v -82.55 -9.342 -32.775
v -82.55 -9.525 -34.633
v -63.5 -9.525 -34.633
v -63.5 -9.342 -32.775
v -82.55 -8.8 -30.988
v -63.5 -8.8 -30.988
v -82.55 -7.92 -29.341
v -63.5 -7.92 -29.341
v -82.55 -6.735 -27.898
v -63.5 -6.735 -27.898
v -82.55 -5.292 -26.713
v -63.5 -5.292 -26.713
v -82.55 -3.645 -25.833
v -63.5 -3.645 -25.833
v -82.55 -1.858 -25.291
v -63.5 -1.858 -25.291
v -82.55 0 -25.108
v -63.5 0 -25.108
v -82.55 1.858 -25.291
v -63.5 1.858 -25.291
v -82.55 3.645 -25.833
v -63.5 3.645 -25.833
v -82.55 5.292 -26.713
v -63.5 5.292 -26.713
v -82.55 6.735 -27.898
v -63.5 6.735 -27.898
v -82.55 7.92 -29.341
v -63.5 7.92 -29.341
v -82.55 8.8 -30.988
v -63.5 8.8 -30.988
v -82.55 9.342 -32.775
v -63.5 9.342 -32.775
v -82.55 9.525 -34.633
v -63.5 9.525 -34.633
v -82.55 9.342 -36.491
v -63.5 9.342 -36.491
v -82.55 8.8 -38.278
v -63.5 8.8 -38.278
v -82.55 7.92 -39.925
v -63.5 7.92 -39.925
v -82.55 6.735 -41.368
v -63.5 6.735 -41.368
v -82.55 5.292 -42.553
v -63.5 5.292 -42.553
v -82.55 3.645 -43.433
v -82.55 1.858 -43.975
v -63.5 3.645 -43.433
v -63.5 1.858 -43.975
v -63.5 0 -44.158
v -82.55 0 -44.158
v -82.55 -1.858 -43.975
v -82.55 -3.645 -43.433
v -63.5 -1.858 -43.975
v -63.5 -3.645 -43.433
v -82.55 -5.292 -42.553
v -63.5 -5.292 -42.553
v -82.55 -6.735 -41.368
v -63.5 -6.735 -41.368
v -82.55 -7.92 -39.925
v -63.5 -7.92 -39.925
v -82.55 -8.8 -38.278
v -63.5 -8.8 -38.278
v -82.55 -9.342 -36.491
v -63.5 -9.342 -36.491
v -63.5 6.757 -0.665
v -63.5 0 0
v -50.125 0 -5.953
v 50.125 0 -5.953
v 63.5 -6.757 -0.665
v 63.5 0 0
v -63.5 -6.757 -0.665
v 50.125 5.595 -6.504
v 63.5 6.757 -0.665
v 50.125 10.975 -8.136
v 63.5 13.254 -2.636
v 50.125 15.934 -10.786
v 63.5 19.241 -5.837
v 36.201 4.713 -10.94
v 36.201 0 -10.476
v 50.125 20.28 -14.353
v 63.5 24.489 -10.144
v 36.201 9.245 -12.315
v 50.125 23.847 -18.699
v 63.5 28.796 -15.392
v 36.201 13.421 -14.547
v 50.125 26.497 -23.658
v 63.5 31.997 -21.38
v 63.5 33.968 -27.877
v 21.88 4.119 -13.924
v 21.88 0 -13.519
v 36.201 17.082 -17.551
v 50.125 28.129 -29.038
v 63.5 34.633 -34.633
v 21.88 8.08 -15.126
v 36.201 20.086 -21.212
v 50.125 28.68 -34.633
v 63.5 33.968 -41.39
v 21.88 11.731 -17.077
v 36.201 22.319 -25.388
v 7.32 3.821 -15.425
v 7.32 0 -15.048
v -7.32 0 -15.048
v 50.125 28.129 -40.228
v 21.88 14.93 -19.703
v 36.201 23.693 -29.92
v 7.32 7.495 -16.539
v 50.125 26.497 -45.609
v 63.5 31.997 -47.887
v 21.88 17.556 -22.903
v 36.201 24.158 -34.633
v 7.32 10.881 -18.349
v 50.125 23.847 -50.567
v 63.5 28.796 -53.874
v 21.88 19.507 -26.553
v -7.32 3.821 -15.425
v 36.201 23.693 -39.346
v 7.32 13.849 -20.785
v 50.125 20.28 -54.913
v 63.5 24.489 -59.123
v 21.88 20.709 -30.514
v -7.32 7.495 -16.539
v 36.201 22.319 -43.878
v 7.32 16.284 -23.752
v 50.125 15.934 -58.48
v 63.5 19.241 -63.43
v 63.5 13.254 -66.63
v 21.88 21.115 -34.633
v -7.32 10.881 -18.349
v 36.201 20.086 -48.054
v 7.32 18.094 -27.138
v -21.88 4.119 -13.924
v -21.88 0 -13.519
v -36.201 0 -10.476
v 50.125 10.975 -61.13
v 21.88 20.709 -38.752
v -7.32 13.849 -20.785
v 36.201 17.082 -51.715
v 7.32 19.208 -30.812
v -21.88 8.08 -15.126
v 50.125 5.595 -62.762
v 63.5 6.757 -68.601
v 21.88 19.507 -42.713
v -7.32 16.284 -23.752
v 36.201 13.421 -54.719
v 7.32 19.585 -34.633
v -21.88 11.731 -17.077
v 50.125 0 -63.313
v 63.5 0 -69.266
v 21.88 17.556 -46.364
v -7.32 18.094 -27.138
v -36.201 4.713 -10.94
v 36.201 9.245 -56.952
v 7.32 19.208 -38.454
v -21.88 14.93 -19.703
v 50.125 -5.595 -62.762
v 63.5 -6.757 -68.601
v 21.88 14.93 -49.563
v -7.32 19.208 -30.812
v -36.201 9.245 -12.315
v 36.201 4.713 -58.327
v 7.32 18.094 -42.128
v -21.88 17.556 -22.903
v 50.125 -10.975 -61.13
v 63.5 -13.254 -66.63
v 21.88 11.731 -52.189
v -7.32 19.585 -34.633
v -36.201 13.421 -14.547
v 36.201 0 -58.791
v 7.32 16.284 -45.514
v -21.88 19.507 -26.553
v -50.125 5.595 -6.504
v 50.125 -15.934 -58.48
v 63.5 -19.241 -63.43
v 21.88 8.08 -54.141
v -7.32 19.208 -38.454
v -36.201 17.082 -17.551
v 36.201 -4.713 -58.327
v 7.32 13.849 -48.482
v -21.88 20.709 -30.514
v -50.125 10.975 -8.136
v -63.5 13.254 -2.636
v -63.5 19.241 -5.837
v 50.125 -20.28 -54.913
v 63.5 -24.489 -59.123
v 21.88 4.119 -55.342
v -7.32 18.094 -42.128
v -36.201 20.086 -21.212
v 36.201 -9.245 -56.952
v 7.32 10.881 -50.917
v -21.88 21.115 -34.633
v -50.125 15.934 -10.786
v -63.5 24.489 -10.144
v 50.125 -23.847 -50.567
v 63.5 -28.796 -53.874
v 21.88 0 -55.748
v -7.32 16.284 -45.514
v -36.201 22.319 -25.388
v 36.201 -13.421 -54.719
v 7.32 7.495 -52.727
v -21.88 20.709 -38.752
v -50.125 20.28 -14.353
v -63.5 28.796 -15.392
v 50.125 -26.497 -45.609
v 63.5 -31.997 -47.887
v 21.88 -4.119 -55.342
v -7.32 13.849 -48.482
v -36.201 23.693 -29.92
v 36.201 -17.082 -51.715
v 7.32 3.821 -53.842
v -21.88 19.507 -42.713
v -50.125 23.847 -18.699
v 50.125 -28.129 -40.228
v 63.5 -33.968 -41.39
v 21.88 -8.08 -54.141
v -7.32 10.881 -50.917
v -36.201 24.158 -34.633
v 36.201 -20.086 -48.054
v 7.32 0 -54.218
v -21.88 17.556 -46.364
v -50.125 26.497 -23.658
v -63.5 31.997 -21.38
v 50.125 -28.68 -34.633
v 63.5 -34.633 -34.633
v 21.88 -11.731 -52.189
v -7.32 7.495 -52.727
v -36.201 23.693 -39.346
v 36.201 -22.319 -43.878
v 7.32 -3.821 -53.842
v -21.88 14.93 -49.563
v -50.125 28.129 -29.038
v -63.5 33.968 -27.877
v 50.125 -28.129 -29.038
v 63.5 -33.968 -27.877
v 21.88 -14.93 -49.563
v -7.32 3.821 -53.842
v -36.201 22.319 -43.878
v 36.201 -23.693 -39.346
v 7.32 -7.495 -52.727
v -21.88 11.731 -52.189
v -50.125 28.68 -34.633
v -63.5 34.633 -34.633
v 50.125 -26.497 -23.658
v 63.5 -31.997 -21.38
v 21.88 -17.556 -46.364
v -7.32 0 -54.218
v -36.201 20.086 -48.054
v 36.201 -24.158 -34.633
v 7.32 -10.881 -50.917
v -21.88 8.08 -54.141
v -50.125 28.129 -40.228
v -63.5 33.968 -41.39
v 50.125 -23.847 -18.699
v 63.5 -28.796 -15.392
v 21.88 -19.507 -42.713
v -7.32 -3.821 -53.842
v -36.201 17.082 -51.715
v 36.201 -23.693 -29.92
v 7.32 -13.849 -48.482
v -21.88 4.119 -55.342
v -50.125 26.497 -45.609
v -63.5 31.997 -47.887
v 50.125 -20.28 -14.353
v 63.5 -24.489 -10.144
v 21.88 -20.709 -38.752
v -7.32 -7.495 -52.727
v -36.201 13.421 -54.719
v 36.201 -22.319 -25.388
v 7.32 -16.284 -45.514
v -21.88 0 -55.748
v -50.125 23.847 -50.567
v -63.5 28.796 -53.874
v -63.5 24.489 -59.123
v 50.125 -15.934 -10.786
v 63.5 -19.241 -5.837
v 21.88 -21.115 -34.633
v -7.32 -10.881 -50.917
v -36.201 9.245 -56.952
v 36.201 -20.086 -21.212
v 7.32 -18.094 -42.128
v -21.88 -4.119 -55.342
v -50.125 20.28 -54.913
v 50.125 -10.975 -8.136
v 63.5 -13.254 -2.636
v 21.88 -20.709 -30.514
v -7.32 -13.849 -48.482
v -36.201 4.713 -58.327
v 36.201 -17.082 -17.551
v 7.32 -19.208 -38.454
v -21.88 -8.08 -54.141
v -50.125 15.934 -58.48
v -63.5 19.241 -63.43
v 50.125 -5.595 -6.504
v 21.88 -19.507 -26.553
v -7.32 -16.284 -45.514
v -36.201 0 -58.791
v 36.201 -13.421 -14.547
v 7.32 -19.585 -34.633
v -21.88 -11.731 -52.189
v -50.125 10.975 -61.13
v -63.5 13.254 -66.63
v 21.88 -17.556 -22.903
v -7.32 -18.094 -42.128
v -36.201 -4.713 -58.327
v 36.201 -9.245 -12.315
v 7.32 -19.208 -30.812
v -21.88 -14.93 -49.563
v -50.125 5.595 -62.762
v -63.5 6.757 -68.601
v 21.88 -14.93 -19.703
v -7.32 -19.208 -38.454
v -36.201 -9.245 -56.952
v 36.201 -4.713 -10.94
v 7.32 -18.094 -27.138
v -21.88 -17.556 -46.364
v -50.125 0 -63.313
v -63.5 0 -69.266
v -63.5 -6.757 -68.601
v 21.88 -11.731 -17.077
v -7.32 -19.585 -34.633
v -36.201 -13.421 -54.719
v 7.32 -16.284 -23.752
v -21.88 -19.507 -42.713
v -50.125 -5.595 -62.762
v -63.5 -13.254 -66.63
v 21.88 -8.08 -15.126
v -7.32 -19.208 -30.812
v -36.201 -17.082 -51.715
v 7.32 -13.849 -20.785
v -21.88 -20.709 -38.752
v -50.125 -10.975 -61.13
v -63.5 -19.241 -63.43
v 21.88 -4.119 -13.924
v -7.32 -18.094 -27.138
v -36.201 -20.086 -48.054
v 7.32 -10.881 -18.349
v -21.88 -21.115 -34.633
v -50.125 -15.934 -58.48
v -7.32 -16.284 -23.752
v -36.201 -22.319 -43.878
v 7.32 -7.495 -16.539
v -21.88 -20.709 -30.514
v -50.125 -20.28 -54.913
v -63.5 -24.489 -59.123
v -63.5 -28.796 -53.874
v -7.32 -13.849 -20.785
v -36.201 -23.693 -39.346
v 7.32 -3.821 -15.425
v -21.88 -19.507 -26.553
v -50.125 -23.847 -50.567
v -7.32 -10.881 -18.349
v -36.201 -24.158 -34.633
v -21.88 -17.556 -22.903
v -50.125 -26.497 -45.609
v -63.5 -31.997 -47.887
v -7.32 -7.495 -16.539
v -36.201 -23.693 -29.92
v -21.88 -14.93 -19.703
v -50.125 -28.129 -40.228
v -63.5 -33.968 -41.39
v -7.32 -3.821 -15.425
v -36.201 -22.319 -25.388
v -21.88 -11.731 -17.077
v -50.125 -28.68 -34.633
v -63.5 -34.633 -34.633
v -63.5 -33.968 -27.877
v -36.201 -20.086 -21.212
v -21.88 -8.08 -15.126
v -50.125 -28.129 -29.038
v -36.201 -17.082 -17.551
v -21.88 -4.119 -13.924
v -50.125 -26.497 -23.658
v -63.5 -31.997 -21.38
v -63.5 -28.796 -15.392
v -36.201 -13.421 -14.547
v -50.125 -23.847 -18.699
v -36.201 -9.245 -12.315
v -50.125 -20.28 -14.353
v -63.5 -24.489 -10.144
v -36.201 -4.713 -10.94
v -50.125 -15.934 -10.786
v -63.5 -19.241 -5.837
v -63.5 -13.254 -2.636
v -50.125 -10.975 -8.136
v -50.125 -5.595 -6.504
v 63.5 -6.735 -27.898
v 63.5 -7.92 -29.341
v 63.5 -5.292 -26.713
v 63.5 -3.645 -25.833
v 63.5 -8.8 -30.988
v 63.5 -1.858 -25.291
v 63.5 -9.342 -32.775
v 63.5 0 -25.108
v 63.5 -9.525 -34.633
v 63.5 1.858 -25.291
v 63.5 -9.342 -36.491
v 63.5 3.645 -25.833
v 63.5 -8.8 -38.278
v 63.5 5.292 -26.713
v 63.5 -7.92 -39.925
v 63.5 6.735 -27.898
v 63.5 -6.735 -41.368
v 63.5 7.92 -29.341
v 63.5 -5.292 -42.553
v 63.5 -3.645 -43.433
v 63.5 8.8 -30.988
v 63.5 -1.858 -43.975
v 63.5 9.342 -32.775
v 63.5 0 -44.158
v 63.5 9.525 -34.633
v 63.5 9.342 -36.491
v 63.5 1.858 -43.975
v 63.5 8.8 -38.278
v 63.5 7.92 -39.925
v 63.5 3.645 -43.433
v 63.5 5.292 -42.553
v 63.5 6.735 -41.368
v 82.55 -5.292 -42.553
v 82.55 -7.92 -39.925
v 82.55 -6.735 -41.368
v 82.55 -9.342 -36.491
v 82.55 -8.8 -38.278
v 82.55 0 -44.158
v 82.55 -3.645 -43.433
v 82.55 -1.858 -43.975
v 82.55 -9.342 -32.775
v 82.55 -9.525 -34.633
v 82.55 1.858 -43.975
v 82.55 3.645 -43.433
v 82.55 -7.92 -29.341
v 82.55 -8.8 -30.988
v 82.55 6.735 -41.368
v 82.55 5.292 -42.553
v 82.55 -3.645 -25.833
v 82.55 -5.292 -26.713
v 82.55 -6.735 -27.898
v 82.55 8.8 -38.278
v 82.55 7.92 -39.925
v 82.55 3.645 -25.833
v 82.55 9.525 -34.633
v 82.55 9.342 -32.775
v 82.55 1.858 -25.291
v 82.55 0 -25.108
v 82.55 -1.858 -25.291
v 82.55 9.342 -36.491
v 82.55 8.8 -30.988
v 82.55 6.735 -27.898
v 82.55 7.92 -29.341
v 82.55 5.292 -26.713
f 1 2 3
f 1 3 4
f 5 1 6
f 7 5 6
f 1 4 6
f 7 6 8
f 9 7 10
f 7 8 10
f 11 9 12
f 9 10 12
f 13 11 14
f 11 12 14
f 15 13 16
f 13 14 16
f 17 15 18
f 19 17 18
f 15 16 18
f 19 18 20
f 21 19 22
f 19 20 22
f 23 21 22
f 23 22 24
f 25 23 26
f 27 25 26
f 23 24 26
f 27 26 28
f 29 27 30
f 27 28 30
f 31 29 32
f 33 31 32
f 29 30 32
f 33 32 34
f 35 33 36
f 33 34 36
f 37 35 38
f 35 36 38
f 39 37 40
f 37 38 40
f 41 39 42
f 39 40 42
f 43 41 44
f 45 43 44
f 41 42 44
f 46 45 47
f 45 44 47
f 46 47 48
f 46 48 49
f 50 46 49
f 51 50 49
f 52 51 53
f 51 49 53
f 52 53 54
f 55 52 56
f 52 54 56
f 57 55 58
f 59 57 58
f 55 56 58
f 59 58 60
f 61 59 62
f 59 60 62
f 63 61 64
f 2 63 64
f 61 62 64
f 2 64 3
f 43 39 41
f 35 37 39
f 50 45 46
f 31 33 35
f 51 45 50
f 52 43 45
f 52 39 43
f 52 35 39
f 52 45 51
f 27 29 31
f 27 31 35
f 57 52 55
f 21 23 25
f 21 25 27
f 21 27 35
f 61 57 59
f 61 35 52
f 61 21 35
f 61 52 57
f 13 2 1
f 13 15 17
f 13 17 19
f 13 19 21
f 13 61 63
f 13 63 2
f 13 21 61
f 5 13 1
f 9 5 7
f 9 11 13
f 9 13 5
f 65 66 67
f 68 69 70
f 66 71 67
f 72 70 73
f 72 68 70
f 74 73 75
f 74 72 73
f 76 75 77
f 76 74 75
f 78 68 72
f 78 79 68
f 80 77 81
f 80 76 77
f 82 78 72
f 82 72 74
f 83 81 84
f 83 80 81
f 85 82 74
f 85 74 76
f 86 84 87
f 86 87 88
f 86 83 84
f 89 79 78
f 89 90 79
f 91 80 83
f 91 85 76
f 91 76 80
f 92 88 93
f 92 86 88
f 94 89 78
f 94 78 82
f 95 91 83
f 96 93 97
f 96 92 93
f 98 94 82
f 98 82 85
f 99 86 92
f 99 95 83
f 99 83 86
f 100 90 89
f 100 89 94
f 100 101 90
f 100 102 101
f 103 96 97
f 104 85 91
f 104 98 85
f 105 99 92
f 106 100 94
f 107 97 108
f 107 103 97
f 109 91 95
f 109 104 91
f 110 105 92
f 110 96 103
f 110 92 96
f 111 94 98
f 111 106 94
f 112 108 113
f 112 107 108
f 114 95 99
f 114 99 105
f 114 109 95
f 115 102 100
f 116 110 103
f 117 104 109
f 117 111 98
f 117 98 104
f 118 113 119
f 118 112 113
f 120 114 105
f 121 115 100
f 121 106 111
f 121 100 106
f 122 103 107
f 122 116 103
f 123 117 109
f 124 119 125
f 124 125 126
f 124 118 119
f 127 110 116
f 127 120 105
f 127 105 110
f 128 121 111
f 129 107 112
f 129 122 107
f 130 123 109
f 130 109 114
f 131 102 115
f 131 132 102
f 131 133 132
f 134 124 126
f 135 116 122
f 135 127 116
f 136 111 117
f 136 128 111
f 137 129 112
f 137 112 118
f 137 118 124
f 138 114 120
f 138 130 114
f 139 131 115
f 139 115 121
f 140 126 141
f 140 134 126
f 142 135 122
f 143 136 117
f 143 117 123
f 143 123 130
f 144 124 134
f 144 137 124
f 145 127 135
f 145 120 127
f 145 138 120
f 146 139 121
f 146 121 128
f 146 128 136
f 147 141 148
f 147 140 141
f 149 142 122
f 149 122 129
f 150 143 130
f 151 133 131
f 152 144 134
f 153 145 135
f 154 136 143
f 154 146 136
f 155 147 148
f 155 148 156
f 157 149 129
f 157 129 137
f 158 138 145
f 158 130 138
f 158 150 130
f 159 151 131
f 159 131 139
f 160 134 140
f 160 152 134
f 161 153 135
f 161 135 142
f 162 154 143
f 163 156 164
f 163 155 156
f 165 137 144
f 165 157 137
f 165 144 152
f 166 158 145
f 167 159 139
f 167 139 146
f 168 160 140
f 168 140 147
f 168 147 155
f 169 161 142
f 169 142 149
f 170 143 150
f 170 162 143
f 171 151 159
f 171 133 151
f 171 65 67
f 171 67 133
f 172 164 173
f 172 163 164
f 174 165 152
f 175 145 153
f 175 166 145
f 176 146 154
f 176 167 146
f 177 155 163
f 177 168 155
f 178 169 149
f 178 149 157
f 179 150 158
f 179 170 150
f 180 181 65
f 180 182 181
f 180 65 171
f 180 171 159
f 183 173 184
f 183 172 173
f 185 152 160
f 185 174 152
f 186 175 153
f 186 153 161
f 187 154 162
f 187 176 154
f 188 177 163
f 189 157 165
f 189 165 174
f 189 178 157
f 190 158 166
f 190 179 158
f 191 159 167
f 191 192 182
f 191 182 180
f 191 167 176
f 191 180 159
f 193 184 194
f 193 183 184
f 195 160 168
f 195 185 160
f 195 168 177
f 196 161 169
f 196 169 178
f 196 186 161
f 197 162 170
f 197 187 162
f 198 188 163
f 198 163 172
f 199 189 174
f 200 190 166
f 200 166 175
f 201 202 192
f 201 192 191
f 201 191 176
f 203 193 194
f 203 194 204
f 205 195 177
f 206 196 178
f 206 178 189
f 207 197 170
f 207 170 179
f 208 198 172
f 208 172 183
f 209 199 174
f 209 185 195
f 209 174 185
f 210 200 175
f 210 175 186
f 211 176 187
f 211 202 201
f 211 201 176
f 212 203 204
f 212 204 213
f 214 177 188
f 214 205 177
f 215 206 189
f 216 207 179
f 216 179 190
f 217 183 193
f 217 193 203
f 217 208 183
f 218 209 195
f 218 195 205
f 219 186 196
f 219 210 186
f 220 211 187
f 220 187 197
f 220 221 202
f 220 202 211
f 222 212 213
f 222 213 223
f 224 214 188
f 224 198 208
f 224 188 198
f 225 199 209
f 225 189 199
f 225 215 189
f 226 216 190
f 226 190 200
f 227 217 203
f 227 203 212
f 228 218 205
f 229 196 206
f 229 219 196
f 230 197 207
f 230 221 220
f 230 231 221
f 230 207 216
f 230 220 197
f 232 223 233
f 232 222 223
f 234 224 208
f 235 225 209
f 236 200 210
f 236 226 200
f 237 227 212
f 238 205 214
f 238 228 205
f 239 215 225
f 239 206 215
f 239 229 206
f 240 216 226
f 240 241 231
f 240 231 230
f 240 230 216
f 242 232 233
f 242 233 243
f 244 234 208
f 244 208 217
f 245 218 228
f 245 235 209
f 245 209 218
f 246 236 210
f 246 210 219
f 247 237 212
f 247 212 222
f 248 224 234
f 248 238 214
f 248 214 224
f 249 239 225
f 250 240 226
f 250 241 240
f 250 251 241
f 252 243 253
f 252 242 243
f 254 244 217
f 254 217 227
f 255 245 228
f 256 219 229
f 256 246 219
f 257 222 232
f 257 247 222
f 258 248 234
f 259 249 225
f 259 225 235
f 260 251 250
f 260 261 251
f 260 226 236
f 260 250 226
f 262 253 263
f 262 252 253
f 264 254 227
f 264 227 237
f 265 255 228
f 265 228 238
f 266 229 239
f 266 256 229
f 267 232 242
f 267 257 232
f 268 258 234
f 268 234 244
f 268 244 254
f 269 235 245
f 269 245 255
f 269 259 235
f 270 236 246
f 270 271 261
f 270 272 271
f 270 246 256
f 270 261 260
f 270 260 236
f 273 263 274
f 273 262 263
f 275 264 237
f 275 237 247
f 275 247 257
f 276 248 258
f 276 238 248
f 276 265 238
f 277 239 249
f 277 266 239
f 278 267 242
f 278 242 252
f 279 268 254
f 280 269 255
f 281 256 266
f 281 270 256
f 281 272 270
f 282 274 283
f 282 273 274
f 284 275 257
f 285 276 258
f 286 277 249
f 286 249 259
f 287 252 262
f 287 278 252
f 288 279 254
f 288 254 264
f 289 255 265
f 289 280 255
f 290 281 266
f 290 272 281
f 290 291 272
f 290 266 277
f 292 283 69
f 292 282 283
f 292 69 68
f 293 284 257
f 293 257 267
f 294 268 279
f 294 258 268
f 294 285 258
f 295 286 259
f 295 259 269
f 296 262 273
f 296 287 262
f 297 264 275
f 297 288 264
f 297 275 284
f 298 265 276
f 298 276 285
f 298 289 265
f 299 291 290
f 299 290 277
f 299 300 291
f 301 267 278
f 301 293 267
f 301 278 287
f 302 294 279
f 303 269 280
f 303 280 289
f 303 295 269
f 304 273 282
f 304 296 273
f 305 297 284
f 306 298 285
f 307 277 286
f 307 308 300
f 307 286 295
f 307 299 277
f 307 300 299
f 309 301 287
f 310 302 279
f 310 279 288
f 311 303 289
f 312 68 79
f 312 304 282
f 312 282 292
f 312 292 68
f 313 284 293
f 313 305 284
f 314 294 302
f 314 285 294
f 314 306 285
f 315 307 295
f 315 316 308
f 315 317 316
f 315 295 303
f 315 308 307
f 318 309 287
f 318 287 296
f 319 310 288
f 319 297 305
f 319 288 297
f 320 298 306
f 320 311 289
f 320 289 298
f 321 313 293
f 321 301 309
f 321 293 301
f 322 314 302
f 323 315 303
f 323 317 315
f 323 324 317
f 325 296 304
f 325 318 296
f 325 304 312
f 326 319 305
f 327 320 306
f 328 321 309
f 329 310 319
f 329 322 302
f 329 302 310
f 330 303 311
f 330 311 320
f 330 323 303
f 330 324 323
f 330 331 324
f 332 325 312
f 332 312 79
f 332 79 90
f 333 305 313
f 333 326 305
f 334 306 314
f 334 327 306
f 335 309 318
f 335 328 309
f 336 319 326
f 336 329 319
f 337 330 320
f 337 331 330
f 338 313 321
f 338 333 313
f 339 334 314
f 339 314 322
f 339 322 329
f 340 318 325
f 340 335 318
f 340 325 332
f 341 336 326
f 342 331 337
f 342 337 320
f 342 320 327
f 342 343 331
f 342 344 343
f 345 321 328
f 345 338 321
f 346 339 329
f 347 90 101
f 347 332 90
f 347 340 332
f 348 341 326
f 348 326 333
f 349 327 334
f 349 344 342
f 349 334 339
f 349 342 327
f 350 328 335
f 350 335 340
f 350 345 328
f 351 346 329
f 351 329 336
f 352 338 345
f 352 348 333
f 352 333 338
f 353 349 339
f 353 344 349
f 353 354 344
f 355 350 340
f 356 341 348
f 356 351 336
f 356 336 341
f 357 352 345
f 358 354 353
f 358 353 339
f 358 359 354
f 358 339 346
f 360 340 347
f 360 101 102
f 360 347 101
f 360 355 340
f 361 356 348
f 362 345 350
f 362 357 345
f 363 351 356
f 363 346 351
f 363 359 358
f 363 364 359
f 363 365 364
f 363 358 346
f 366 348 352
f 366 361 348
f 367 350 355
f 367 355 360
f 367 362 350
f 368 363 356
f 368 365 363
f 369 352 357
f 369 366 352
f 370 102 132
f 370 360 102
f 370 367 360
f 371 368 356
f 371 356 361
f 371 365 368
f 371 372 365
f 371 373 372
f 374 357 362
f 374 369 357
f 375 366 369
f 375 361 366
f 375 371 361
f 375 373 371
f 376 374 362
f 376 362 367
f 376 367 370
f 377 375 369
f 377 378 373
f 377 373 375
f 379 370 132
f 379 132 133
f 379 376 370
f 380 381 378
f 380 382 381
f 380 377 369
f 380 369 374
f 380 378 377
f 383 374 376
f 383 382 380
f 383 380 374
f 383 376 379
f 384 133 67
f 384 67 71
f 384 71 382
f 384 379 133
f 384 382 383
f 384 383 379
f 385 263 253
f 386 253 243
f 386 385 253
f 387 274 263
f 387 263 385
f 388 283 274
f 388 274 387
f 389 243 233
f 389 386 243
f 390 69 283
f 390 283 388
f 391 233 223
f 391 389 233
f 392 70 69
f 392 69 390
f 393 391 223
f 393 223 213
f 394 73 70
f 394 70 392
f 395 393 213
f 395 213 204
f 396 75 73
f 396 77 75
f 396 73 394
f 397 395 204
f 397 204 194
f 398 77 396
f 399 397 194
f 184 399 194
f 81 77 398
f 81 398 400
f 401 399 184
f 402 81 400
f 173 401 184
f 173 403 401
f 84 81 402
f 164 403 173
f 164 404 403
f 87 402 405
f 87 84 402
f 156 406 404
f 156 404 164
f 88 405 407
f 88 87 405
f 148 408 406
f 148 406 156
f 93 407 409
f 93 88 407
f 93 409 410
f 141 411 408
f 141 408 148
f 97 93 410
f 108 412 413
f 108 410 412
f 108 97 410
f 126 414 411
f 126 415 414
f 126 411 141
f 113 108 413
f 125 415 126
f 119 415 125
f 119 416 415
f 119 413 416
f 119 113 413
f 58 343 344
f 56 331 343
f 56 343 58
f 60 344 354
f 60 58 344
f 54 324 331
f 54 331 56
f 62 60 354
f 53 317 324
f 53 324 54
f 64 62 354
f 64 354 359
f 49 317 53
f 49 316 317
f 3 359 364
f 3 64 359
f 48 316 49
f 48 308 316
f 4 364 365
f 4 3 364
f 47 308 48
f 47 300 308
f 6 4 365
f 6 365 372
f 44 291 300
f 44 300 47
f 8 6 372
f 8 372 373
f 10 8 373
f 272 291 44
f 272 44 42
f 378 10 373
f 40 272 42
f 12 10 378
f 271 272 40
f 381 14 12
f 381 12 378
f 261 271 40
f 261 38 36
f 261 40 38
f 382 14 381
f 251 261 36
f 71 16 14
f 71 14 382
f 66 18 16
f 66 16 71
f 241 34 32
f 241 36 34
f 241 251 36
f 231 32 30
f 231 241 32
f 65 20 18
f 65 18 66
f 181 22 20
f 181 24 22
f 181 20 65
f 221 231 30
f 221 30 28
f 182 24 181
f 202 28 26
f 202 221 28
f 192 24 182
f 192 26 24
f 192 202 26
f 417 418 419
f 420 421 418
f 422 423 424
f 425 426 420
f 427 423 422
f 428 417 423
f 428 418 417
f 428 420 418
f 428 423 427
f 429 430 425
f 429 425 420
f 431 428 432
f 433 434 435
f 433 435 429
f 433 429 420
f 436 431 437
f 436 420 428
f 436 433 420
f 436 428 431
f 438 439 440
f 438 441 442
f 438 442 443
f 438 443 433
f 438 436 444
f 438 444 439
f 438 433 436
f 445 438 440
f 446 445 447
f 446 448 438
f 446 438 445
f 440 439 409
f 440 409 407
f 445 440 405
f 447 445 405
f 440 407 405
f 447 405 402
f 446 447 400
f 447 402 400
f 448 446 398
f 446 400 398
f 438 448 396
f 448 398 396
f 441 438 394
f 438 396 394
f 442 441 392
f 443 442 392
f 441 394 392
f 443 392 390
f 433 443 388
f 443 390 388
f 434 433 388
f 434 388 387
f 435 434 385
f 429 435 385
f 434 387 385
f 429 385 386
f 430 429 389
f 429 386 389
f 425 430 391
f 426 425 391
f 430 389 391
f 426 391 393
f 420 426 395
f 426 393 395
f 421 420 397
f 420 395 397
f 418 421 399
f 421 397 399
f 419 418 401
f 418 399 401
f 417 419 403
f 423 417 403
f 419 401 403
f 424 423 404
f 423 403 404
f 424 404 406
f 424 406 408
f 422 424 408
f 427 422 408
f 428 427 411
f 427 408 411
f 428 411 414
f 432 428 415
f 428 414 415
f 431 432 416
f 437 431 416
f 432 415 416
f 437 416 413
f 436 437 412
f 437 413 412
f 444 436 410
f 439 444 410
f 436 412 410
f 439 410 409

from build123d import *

# Parameters (mm, degrees)
F2_R     = 9.525
F3_DEPTH = 19.05
F4_R     = 9.525
F5_DEPTH = 19.05


with BuildPart() as f1:
    # F0 (on Front) → F1 (revolve)
    with BuildSketch(Plane.XZ):
        with BuildLine():
            ThreePointArc((63.5, 0), (0, -15.24), (-63.5, 0))
            Line((-63.5, 0), (-63.5, -34.633189))
            Line((-63.5, -34.633189), (63.5, -34.633189))
            Line((63.5, -34.633189), (63.5, 0))
        make_face()
    revolve(axis=Axis((0, 0, -34.633189), (-1, 0, 0)))

    # F2 (on face) → F3 (join)
    with BuildSketch(Plane(origin=(-63.5, 0, 0), x_dir=(0, -1, 0), z_dir=(-1, 0, 0))):
        with Locations((0, -34.633189)):
            Circle(F2_R)
    extrude(amount=F3_DEPTH)

    # F4 (on face) → F5 (join)
    with BuildSketch(Plane.YZ.offset(63.5)):
        with Locations((0, -34.633189)):
            Circle(F4_R)
    extrude(amount=F5_DEPTH)


solid = f1.part
